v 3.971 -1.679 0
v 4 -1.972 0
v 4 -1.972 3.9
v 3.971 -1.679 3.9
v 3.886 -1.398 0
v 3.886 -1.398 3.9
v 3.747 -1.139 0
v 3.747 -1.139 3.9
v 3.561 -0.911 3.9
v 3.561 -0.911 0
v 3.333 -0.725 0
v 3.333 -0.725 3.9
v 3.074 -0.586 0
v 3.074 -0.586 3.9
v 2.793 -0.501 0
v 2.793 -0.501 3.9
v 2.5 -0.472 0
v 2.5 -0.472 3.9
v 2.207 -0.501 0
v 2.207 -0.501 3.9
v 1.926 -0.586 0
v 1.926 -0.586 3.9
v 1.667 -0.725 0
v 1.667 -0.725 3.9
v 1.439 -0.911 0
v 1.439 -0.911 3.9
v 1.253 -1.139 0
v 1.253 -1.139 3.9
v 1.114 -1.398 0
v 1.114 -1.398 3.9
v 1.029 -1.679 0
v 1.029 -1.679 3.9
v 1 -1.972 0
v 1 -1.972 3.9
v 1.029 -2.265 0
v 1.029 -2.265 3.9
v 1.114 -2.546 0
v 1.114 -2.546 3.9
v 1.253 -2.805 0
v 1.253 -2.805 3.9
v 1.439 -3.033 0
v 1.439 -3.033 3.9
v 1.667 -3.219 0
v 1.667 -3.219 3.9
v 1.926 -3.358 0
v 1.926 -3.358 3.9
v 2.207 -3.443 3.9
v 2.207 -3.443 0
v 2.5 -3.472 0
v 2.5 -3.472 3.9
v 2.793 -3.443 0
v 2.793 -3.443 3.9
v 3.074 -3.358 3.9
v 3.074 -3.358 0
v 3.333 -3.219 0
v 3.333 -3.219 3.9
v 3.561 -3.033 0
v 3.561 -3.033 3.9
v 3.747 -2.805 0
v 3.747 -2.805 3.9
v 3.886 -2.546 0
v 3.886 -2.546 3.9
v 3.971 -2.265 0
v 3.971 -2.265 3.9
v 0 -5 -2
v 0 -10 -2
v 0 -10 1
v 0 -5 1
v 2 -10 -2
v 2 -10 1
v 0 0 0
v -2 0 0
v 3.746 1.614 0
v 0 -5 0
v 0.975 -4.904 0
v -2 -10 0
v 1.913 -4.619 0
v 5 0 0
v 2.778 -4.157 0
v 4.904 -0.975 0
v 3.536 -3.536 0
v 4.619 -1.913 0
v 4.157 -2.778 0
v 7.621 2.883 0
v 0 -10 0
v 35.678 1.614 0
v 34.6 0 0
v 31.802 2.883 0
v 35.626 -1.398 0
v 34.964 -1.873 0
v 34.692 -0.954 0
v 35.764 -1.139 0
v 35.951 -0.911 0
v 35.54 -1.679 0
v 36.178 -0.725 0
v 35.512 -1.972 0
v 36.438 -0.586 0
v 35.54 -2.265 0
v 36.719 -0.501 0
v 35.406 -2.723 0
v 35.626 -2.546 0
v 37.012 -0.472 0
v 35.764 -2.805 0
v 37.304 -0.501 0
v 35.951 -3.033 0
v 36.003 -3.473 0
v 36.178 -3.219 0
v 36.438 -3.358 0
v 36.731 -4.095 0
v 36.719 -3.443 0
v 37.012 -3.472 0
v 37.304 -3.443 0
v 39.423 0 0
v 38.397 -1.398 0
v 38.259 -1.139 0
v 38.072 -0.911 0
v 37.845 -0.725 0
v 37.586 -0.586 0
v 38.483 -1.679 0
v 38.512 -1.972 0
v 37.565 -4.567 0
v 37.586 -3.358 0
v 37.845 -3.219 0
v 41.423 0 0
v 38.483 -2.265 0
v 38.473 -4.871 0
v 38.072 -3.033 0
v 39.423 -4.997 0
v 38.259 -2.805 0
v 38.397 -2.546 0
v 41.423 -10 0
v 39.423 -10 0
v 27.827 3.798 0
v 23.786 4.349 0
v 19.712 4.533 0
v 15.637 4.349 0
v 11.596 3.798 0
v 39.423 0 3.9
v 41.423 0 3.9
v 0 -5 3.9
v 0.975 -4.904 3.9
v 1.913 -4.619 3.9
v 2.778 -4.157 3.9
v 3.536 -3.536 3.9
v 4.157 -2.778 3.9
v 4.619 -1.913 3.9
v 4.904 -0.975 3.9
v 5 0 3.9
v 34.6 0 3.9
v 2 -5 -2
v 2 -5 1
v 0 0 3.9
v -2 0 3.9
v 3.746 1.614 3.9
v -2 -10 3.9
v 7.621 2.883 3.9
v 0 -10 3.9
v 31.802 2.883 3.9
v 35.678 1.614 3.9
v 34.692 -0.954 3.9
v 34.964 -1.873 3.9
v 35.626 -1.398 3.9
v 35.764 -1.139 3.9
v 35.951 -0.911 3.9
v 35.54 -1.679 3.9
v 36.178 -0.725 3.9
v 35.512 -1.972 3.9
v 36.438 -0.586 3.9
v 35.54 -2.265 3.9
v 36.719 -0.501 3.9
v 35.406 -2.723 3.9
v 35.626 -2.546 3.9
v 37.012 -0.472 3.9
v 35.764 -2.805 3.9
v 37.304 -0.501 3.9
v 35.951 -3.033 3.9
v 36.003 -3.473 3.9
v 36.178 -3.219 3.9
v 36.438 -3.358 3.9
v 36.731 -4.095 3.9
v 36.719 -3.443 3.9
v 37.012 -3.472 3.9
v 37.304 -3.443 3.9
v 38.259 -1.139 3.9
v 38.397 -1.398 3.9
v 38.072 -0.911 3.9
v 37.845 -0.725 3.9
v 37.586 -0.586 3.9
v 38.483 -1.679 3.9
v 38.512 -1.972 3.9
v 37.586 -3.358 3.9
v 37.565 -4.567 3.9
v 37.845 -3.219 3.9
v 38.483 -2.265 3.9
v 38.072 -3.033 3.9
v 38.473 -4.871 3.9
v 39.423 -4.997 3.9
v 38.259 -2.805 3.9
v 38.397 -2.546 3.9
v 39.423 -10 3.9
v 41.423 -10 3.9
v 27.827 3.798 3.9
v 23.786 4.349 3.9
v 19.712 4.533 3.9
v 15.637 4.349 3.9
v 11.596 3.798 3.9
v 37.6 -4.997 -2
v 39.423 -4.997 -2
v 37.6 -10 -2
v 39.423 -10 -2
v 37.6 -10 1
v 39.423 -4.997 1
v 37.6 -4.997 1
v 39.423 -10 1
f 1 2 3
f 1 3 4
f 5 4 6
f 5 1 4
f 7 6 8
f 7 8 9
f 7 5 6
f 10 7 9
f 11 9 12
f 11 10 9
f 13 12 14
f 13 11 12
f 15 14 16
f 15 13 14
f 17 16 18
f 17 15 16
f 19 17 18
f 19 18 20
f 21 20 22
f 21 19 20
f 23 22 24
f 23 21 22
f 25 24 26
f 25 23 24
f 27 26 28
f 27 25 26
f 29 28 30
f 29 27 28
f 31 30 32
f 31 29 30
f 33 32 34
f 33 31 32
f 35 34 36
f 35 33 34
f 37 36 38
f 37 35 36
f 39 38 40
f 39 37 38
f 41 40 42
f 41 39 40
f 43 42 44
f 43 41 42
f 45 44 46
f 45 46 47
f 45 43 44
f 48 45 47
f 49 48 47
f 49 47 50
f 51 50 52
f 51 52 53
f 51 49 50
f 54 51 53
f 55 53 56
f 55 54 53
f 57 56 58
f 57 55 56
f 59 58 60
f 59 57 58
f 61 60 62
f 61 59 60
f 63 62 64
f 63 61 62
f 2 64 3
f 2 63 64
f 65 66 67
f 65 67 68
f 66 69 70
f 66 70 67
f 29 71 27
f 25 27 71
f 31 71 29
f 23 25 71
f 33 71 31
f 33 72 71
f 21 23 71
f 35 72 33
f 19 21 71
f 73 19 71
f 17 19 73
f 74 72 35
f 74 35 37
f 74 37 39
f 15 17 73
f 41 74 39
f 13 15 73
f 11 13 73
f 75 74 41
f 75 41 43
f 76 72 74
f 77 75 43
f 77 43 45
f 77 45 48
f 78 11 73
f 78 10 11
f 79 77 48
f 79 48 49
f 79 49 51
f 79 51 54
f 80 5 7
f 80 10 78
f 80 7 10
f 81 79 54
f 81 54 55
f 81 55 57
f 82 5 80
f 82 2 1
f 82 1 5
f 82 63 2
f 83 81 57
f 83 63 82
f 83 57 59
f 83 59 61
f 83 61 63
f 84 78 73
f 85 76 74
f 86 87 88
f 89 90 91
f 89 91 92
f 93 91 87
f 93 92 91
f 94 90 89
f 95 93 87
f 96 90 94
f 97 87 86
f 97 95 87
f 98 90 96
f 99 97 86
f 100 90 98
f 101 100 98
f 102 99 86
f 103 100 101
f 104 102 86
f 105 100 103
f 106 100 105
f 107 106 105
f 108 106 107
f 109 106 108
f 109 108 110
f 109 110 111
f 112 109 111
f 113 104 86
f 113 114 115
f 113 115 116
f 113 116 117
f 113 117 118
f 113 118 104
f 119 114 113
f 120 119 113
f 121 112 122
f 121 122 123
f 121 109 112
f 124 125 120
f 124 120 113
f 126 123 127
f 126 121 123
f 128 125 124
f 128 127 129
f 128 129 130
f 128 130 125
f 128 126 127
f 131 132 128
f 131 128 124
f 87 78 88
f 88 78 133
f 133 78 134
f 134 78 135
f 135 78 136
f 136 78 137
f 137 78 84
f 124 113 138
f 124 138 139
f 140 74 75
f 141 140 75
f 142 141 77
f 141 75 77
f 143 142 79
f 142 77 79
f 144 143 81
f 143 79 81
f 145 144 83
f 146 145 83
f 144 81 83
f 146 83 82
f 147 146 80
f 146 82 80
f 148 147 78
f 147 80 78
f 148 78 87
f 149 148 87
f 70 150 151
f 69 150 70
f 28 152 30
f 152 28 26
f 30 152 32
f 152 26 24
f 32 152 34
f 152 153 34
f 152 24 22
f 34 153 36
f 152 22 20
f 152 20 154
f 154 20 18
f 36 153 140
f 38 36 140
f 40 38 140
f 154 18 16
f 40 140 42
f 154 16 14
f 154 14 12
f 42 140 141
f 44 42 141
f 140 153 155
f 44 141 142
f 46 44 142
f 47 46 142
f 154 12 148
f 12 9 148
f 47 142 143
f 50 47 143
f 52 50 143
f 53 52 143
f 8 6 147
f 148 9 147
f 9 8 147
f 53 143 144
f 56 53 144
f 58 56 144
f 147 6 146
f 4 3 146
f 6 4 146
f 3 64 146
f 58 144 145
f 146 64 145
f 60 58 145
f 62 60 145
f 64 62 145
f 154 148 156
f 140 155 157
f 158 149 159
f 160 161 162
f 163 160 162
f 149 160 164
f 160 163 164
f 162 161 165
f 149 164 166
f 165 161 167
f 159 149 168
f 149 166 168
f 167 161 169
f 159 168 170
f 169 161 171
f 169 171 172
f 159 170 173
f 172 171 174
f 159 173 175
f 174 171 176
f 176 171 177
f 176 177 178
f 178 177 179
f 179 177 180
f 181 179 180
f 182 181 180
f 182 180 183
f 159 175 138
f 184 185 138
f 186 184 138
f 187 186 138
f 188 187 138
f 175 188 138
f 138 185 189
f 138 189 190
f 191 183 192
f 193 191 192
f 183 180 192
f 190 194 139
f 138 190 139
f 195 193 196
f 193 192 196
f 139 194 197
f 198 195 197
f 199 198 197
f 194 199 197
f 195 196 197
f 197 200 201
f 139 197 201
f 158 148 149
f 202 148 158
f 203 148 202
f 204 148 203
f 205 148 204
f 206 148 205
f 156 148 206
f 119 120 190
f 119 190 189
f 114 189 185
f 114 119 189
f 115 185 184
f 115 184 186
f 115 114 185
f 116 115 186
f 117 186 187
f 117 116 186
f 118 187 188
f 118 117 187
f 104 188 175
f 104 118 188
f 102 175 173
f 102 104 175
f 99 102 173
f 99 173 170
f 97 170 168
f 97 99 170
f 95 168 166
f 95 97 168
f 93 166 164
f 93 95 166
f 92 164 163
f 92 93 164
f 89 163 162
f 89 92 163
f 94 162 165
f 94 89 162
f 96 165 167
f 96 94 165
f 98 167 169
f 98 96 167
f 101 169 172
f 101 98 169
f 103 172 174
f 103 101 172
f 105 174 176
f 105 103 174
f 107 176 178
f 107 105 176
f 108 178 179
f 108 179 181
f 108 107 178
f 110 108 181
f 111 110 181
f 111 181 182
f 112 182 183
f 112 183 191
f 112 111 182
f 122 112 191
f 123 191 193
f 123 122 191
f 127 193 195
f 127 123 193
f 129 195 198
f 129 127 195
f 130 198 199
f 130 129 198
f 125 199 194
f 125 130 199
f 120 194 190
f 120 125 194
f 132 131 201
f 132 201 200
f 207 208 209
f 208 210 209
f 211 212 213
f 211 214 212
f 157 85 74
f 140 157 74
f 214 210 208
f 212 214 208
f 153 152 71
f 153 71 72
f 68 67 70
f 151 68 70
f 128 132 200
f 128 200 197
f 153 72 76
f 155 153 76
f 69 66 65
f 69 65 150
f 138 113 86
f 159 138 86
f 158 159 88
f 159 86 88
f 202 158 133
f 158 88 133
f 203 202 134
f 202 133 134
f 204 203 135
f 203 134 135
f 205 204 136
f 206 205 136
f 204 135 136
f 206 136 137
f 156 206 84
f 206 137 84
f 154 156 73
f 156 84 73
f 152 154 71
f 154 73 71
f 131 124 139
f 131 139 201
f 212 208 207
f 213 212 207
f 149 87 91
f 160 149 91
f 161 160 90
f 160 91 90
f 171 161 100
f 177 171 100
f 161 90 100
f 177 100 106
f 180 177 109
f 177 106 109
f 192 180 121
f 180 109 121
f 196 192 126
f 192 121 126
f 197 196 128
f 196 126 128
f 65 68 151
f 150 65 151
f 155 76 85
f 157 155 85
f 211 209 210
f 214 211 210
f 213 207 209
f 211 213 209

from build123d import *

# Parameters (mm, degrees)
CROQUIS1_R                     = 1.5
SALIENTE_EXTRUIR1_DEPTH        = 3.9
SALIENTE_EXTRUIR2_DEPTH        = 3.9
SALIENTE_EXTRUIR4_DEPTH        = 1
SALIENTE_EXTRUIR4_DEPTH_BACK   = 2
SALIENTE_EXTRUIR4_2_DEPTH      = 1
SALIENTE_EXTRUIR4_2_DEPTH_BACK = 2


with BuildPart() as part:
    # Croquis1 → Saliente-Extruir1 (new body)
    with BuildSketch(Plane.XY):
        with BuildLine():
            ThreePointArc((39.42330407, 0), (19.711652035, 4.533364671), (0, 0))
            Line((0, 0), (0, -5))
            ThreePointArc((0, -5), (3.535533906, -3.535533906), (5, 0))
            Line((5, 0), (34.6, 0))
            ThreePointArc((34.6, 0), (36.002537029, -3.472500565), (39.42330407, -4.996876879))
            Line((39.42330407, -4.996876879), (39.42330407, 0))
        make_face()
        with Locations((2.5, -1.972000375)):
            Circle(CROQUIS1_R, mode=Mode.SUBTRACT)
        with Locations((37.011652035, -1.972000375)):
            Circle(CROQUIS1_R, mode=Mode.SUBTRACT)
    extrude(amount=SALIENTE_EXTRUIR1_DEPTH)

    # Croquis3D3 → Saliente-Extruir2 (add)
    with BuildSketch(Plane(origin=(39.42330407, 0, 0), x_dir=(-0.9720754027566177, -0.2346687268375561, 0), z_dir=(0, 0, 1))):
        Polygon((0, 0), (-1.944150806, 0.469337454), (0.402536463, 10.190091481), (2.346687268, 9.720754028), align=None)
        Polygon((38.322424182, -9.251416574), (40.266574988, -9.720754028), (42.613262256, 0), (40.66911145, 0.469337454), align=None)
    extrude(amount=SALIENTE_EXTRUIR2_DEPTH)


with BuildPart() as body_2:
    # Croquis3D4 → Saliente-Extruir4 (new, two sides: drawn at the far end of the back side and taken through both)
    with BuildSketch(Plane(origin=(39.42330407, -4.996876879, 0), x_dir=(-0.9920431942742338, -0.12589797732360491, 0), z_dir=(0, 0, 1)).offset(-SALIENTE_EXTRUIR4_DEPTH_BACK)):
        Polygon((0, 0), (1.808796394, -0.229550294), (2.438679475, 4.733763947), (0.629883081, 4.963314242), align=None)
    extrude(amount=SALIENTE_EXTRUIR4_DEPTH + SALIENTE_EXTRUIR4_DEPTH_BACK)


with BuildPart() as body_3:
    # Croquis3D4 → Saliente-Extruir4 2 (new, two sides: drawn at the far end of the back side and taken through both)
    with BuildSketch(Plane(origin=(39.42330407, -4.996876879, 0), x_dir=(-0.9920431942742338, -0.12589797732360491, 0), z_dir=(0, 0, 1)).offset(-SALIENTE_EXTRUIR4_2_DEPTH_BACK)):
        Polygon((39.73950358, 0), (39.110013693, -4.960215971), (37.125927305, -4.708420017), (37.755417191, 0.251795955), align=None)
    extrude(amount=SALIENTE_EXTRUIR4_2_DEPTH + SALIENTE_EXTRUIR4_2_DEPTH_BACK)


solid = Compound([part.part, body_2.part, body_3.part])
